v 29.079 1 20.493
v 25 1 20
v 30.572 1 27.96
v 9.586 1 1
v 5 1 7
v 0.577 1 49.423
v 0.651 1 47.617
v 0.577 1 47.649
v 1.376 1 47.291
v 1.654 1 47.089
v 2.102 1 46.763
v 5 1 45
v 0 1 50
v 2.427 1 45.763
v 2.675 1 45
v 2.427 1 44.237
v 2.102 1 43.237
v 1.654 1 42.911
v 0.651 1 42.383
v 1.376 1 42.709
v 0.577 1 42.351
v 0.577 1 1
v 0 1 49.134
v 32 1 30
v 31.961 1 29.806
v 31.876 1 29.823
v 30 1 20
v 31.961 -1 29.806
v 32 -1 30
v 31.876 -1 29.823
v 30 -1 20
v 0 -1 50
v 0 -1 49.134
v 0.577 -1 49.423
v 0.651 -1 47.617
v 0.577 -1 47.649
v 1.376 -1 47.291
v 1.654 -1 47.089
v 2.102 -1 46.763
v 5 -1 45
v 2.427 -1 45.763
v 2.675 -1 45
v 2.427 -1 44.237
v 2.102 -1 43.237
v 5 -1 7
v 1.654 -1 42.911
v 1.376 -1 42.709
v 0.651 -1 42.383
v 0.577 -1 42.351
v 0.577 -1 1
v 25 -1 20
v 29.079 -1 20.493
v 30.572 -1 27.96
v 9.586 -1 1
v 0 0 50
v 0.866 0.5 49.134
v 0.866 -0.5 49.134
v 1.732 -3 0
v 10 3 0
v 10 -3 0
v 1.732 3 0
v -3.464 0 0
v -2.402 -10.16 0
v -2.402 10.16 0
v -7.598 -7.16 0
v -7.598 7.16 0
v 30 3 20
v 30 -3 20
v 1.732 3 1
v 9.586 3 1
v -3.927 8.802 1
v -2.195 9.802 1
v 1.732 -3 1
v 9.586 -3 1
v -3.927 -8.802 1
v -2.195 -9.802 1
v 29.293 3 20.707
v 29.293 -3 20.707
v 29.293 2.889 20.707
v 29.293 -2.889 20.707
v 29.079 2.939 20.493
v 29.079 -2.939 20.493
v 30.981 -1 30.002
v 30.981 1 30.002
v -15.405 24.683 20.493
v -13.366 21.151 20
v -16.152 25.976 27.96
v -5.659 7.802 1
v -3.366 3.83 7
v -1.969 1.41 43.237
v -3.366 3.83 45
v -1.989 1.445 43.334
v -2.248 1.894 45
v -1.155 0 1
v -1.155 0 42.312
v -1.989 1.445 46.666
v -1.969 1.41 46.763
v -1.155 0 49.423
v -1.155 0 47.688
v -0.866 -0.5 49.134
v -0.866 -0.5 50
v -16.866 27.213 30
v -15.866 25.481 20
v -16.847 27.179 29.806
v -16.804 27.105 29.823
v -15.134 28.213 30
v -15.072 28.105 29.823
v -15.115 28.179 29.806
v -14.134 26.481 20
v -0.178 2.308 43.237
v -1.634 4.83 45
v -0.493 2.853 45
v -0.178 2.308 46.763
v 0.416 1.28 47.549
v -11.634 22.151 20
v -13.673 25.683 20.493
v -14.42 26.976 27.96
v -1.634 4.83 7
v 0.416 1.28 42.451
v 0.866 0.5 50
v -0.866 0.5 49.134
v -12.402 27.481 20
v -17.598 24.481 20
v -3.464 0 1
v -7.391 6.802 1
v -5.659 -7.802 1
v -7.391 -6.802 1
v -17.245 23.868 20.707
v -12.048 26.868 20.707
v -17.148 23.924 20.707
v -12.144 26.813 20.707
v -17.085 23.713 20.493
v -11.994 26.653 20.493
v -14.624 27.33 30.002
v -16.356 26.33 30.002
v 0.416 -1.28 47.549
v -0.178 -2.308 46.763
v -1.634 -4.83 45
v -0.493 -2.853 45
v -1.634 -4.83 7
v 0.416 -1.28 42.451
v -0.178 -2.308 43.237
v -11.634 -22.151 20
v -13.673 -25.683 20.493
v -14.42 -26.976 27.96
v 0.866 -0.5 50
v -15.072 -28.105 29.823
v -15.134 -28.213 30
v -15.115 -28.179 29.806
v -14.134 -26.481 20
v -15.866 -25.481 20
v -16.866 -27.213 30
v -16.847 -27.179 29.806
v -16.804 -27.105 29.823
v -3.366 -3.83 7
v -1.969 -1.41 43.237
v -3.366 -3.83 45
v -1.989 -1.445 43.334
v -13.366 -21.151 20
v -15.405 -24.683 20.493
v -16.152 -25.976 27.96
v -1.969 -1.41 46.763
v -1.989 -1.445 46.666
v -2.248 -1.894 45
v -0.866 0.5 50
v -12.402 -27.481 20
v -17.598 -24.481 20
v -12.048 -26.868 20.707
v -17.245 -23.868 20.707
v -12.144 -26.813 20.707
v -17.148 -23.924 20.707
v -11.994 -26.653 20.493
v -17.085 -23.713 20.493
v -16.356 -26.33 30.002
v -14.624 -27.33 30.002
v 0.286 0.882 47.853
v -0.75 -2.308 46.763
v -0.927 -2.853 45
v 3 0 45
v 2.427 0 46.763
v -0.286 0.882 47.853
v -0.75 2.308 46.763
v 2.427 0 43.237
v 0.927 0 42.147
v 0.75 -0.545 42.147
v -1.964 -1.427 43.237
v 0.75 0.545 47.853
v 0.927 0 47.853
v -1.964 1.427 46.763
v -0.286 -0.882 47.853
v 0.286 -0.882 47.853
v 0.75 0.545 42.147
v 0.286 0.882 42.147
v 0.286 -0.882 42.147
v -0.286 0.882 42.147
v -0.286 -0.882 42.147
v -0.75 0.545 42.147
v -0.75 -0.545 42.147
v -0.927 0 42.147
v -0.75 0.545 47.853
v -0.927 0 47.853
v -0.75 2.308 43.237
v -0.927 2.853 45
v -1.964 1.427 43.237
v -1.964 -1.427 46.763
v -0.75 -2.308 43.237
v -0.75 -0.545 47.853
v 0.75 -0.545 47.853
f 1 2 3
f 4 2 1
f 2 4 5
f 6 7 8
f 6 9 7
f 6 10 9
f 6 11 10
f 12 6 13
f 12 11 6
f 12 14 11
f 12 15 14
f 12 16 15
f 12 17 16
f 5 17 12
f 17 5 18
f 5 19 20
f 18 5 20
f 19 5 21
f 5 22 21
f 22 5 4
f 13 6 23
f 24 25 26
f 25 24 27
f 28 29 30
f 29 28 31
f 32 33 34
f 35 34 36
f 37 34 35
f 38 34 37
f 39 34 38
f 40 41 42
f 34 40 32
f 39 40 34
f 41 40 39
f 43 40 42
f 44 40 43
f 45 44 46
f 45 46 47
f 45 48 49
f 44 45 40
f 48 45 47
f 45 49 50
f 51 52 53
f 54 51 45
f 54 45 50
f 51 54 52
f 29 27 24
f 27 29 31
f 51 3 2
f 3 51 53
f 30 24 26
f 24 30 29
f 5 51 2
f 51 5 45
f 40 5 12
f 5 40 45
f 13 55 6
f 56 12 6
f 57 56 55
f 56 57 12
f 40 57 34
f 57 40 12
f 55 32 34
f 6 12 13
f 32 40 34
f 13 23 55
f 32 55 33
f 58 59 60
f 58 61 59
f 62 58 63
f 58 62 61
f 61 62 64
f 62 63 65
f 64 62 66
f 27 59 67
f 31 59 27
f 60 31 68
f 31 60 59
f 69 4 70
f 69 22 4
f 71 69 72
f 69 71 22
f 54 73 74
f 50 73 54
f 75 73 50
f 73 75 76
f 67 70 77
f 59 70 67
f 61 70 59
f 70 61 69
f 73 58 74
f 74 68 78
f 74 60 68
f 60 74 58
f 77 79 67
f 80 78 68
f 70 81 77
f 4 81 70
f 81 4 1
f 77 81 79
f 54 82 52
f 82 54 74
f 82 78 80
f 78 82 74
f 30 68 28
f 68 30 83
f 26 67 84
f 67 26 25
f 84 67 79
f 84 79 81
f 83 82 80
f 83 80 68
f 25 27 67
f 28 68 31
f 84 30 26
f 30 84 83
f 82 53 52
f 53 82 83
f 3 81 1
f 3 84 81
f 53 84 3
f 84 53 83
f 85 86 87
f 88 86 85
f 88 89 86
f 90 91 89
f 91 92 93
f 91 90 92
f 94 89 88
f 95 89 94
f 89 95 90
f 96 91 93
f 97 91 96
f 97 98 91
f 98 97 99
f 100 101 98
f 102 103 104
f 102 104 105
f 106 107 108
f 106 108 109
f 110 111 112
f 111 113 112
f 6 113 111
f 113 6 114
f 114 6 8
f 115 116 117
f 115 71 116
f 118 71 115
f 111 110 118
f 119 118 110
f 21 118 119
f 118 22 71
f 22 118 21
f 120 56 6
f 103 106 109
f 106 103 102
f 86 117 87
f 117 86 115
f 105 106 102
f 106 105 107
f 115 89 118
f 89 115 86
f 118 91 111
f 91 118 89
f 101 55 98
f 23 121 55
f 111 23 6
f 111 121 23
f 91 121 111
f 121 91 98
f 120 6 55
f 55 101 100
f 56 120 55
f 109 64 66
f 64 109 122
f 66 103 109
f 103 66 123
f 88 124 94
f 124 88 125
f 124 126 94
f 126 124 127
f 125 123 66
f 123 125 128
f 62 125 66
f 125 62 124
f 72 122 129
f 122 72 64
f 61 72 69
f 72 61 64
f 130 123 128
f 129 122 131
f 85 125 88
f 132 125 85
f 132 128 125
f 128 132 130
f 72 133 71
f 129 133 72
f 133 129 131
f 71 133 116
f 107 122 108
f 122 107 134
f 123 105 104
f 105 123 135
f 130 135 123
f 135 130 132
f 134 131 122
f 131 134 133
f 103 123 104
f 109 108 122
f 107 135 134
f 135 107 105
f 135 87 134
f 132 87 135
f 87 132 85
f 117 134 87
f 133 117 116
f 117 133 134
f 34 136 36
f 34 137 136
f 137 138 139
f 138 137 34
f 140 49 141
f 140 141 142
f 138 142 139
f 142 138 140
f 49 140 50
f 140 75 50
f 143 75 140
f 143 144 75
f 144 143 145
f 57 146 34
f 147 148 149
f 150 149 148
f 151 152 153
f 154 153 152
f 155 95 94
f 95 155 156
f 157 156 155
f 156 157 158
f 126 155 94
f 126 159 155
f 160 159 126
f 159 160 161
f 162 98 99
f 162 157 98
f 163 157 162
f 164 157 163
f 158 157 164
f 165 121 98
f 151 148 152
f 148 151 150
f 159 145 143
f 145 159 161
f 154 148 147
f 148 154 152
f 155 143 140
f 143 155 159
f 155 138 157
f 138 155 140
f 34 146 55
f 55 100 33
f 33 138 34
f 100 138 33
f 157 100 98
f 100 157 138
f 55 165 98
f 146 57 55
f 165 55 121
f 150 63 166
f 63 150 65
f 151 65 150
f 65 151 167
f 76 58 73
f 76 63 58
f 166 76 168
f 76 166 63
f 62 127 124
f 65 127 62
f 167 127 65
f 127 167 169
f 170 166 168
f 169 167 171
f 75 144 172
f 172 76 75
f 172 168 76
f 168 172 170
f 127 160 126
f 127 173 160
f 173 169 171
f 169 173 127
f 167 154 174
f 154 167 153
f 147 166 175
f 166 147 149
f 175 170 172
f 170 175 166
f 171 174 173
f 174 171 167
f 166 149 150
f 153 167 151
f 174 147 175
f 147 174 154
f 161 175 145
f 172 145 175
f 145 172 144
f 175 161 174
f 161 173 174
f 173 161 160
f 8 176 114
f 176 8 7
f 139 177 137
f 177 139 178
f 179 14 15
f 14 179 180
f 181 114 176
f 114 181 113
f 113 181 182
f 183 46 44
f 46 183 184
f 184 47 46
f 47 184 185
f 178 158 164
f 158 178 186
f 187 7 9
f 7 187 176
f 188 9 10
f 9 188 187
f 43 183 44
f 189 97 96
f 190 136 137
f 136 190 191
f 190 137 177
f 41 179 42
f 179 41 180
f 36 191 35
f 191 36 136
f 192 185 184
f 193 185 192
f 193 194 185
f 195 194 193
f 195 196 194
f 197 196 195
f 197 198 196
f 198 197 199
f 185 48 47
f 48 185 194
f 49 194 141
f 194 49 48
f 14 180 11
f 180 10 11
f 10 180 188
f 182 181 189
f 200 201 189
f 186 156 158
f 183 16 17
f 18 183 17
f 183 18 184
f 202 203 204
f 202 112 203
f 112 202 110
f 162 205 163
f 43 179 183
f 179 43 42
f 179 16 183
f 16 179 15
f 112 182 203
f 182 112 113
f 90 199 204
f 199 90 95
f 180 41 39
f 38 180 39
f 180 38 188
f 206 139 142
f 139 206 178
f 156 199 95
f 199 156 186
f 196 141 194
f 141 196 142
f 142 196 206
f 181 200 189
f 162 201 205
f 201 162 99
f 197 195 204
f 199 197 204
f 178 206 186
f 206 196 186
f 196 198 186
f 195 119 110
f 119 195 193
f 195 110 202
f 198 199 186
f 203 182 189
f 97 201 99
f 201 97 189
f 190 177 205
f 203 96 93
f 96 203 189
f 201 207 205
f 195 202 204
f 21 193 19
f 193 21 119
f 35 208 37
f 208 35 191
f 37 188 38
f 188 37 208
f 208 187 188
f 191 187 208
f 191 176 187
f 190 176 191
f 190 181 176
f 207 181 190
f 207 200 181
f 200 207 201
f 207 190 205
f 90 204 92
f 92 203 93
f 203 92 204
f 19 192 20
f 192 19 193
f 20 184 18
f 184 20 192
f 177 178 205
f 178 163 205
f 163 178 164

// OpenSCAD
use <MCAD/2Dshapes.scad>

module triangle (w_b, h, l, centre = false)
{

    points = [
    [0,0],
    [w_b,0],
    [w_b/2,h],
    ];

    trans = (centre == true) ? [-w_b/2,-h/2,0] : [0,0,0] ;

    translate(trans)
        linear_extrude(l)
            polygon(points);
}

module trapezoid (w_b, w_t, h, l, centre = false)
{
    top_offset = ( w_b - w_t )/2;

    points = [
    [0,0],
    [w_b,0],
    [top_offset+w_t,h],
    [top_offset,h]
    ];

    trans = (centre == true) ? [-w_b/2,-h/2,0] : [0,0,0] ;

    translate(trans)
        linear_extrude(l)
            polygon(points);
}



w_shaft = 5;
l_shaft = 50;
w_head = 10;
h_head = 7;
w_arm = 30;
h_arm = 20;
w_arm_end = 5;
point_width = 2;
point_height = 10;
w_point = w_arm + point_width;
h_point = h_arm + point_height;
w_reinforcer = 6;
thk_reinforcer = 1;
thk_hook = 2;
num_hooks = 3;

hole_dia = 6;

grap_points = 
[
[0,0],
[w_head,0],
[w_arm,h_arm],
[w_point,h_point],
[w_arm-w_arm_end,h_arm],
[w_shaft,h_head],
[w_shaft,l_shaft-w_shaft],
[0,l_shaft],
[0,0]
];

module arm()
{
    union()
    {
    rotate([90,0,0])
        linear_extrude(height=thk_hook,center=true)
            {
                polygon(grap_points);
            }
     translate([0,-w_reinforcer/2,0])
                cube([w_head,w_reinforcer,thk_reinforcer]);
            
      l_arm_flange = sqrt ( pow(h_arm, 2) + pow(w_arm-w_head, 2));
            
      arm_flange_angle = atan( (w_arm-w_head)/h_arm );
            
      translate([w_head,-w_reinforcer/2,0])
        rotate([0,-arm_flange_angle,0])
            cube([l_arm_flange,w_reinforcer,thk_reinforcer]);
            
      //l_arm_flange = sqrt ( pow(h_arm, 2) + pow(w_arm-w_head, 2));
      
      w_point = w_arm + point_width;
      h_point = h_arm + point_height;
      arm_point_angle = atan( (point_height)/point_width );
            
            rotate([0,0,-90])
             translate([-w_reinforcer/2,w_arm,h_arm])           
      rotate([arm_point_angle,0,0])
        
            trapezoid(w_reinforcer,thk_hook,point_height,thk_reinforcer,0);      
            
      }
}

difference()
{
    union()
    {
	
rot_angle = 360/num_hooks;
for(i = [0: rot_angle: 359])
{
    echo(i);
    rotate([0,0,i])
arm();
}


//    arm();
//    rotate([0,0,120])
//        arm();
//    rotate([0,0,2*120])
//        arm();
    }
    
    translate([0,0,l_shaft-w_shaft])
        sphere(d=hole_dia);
}
